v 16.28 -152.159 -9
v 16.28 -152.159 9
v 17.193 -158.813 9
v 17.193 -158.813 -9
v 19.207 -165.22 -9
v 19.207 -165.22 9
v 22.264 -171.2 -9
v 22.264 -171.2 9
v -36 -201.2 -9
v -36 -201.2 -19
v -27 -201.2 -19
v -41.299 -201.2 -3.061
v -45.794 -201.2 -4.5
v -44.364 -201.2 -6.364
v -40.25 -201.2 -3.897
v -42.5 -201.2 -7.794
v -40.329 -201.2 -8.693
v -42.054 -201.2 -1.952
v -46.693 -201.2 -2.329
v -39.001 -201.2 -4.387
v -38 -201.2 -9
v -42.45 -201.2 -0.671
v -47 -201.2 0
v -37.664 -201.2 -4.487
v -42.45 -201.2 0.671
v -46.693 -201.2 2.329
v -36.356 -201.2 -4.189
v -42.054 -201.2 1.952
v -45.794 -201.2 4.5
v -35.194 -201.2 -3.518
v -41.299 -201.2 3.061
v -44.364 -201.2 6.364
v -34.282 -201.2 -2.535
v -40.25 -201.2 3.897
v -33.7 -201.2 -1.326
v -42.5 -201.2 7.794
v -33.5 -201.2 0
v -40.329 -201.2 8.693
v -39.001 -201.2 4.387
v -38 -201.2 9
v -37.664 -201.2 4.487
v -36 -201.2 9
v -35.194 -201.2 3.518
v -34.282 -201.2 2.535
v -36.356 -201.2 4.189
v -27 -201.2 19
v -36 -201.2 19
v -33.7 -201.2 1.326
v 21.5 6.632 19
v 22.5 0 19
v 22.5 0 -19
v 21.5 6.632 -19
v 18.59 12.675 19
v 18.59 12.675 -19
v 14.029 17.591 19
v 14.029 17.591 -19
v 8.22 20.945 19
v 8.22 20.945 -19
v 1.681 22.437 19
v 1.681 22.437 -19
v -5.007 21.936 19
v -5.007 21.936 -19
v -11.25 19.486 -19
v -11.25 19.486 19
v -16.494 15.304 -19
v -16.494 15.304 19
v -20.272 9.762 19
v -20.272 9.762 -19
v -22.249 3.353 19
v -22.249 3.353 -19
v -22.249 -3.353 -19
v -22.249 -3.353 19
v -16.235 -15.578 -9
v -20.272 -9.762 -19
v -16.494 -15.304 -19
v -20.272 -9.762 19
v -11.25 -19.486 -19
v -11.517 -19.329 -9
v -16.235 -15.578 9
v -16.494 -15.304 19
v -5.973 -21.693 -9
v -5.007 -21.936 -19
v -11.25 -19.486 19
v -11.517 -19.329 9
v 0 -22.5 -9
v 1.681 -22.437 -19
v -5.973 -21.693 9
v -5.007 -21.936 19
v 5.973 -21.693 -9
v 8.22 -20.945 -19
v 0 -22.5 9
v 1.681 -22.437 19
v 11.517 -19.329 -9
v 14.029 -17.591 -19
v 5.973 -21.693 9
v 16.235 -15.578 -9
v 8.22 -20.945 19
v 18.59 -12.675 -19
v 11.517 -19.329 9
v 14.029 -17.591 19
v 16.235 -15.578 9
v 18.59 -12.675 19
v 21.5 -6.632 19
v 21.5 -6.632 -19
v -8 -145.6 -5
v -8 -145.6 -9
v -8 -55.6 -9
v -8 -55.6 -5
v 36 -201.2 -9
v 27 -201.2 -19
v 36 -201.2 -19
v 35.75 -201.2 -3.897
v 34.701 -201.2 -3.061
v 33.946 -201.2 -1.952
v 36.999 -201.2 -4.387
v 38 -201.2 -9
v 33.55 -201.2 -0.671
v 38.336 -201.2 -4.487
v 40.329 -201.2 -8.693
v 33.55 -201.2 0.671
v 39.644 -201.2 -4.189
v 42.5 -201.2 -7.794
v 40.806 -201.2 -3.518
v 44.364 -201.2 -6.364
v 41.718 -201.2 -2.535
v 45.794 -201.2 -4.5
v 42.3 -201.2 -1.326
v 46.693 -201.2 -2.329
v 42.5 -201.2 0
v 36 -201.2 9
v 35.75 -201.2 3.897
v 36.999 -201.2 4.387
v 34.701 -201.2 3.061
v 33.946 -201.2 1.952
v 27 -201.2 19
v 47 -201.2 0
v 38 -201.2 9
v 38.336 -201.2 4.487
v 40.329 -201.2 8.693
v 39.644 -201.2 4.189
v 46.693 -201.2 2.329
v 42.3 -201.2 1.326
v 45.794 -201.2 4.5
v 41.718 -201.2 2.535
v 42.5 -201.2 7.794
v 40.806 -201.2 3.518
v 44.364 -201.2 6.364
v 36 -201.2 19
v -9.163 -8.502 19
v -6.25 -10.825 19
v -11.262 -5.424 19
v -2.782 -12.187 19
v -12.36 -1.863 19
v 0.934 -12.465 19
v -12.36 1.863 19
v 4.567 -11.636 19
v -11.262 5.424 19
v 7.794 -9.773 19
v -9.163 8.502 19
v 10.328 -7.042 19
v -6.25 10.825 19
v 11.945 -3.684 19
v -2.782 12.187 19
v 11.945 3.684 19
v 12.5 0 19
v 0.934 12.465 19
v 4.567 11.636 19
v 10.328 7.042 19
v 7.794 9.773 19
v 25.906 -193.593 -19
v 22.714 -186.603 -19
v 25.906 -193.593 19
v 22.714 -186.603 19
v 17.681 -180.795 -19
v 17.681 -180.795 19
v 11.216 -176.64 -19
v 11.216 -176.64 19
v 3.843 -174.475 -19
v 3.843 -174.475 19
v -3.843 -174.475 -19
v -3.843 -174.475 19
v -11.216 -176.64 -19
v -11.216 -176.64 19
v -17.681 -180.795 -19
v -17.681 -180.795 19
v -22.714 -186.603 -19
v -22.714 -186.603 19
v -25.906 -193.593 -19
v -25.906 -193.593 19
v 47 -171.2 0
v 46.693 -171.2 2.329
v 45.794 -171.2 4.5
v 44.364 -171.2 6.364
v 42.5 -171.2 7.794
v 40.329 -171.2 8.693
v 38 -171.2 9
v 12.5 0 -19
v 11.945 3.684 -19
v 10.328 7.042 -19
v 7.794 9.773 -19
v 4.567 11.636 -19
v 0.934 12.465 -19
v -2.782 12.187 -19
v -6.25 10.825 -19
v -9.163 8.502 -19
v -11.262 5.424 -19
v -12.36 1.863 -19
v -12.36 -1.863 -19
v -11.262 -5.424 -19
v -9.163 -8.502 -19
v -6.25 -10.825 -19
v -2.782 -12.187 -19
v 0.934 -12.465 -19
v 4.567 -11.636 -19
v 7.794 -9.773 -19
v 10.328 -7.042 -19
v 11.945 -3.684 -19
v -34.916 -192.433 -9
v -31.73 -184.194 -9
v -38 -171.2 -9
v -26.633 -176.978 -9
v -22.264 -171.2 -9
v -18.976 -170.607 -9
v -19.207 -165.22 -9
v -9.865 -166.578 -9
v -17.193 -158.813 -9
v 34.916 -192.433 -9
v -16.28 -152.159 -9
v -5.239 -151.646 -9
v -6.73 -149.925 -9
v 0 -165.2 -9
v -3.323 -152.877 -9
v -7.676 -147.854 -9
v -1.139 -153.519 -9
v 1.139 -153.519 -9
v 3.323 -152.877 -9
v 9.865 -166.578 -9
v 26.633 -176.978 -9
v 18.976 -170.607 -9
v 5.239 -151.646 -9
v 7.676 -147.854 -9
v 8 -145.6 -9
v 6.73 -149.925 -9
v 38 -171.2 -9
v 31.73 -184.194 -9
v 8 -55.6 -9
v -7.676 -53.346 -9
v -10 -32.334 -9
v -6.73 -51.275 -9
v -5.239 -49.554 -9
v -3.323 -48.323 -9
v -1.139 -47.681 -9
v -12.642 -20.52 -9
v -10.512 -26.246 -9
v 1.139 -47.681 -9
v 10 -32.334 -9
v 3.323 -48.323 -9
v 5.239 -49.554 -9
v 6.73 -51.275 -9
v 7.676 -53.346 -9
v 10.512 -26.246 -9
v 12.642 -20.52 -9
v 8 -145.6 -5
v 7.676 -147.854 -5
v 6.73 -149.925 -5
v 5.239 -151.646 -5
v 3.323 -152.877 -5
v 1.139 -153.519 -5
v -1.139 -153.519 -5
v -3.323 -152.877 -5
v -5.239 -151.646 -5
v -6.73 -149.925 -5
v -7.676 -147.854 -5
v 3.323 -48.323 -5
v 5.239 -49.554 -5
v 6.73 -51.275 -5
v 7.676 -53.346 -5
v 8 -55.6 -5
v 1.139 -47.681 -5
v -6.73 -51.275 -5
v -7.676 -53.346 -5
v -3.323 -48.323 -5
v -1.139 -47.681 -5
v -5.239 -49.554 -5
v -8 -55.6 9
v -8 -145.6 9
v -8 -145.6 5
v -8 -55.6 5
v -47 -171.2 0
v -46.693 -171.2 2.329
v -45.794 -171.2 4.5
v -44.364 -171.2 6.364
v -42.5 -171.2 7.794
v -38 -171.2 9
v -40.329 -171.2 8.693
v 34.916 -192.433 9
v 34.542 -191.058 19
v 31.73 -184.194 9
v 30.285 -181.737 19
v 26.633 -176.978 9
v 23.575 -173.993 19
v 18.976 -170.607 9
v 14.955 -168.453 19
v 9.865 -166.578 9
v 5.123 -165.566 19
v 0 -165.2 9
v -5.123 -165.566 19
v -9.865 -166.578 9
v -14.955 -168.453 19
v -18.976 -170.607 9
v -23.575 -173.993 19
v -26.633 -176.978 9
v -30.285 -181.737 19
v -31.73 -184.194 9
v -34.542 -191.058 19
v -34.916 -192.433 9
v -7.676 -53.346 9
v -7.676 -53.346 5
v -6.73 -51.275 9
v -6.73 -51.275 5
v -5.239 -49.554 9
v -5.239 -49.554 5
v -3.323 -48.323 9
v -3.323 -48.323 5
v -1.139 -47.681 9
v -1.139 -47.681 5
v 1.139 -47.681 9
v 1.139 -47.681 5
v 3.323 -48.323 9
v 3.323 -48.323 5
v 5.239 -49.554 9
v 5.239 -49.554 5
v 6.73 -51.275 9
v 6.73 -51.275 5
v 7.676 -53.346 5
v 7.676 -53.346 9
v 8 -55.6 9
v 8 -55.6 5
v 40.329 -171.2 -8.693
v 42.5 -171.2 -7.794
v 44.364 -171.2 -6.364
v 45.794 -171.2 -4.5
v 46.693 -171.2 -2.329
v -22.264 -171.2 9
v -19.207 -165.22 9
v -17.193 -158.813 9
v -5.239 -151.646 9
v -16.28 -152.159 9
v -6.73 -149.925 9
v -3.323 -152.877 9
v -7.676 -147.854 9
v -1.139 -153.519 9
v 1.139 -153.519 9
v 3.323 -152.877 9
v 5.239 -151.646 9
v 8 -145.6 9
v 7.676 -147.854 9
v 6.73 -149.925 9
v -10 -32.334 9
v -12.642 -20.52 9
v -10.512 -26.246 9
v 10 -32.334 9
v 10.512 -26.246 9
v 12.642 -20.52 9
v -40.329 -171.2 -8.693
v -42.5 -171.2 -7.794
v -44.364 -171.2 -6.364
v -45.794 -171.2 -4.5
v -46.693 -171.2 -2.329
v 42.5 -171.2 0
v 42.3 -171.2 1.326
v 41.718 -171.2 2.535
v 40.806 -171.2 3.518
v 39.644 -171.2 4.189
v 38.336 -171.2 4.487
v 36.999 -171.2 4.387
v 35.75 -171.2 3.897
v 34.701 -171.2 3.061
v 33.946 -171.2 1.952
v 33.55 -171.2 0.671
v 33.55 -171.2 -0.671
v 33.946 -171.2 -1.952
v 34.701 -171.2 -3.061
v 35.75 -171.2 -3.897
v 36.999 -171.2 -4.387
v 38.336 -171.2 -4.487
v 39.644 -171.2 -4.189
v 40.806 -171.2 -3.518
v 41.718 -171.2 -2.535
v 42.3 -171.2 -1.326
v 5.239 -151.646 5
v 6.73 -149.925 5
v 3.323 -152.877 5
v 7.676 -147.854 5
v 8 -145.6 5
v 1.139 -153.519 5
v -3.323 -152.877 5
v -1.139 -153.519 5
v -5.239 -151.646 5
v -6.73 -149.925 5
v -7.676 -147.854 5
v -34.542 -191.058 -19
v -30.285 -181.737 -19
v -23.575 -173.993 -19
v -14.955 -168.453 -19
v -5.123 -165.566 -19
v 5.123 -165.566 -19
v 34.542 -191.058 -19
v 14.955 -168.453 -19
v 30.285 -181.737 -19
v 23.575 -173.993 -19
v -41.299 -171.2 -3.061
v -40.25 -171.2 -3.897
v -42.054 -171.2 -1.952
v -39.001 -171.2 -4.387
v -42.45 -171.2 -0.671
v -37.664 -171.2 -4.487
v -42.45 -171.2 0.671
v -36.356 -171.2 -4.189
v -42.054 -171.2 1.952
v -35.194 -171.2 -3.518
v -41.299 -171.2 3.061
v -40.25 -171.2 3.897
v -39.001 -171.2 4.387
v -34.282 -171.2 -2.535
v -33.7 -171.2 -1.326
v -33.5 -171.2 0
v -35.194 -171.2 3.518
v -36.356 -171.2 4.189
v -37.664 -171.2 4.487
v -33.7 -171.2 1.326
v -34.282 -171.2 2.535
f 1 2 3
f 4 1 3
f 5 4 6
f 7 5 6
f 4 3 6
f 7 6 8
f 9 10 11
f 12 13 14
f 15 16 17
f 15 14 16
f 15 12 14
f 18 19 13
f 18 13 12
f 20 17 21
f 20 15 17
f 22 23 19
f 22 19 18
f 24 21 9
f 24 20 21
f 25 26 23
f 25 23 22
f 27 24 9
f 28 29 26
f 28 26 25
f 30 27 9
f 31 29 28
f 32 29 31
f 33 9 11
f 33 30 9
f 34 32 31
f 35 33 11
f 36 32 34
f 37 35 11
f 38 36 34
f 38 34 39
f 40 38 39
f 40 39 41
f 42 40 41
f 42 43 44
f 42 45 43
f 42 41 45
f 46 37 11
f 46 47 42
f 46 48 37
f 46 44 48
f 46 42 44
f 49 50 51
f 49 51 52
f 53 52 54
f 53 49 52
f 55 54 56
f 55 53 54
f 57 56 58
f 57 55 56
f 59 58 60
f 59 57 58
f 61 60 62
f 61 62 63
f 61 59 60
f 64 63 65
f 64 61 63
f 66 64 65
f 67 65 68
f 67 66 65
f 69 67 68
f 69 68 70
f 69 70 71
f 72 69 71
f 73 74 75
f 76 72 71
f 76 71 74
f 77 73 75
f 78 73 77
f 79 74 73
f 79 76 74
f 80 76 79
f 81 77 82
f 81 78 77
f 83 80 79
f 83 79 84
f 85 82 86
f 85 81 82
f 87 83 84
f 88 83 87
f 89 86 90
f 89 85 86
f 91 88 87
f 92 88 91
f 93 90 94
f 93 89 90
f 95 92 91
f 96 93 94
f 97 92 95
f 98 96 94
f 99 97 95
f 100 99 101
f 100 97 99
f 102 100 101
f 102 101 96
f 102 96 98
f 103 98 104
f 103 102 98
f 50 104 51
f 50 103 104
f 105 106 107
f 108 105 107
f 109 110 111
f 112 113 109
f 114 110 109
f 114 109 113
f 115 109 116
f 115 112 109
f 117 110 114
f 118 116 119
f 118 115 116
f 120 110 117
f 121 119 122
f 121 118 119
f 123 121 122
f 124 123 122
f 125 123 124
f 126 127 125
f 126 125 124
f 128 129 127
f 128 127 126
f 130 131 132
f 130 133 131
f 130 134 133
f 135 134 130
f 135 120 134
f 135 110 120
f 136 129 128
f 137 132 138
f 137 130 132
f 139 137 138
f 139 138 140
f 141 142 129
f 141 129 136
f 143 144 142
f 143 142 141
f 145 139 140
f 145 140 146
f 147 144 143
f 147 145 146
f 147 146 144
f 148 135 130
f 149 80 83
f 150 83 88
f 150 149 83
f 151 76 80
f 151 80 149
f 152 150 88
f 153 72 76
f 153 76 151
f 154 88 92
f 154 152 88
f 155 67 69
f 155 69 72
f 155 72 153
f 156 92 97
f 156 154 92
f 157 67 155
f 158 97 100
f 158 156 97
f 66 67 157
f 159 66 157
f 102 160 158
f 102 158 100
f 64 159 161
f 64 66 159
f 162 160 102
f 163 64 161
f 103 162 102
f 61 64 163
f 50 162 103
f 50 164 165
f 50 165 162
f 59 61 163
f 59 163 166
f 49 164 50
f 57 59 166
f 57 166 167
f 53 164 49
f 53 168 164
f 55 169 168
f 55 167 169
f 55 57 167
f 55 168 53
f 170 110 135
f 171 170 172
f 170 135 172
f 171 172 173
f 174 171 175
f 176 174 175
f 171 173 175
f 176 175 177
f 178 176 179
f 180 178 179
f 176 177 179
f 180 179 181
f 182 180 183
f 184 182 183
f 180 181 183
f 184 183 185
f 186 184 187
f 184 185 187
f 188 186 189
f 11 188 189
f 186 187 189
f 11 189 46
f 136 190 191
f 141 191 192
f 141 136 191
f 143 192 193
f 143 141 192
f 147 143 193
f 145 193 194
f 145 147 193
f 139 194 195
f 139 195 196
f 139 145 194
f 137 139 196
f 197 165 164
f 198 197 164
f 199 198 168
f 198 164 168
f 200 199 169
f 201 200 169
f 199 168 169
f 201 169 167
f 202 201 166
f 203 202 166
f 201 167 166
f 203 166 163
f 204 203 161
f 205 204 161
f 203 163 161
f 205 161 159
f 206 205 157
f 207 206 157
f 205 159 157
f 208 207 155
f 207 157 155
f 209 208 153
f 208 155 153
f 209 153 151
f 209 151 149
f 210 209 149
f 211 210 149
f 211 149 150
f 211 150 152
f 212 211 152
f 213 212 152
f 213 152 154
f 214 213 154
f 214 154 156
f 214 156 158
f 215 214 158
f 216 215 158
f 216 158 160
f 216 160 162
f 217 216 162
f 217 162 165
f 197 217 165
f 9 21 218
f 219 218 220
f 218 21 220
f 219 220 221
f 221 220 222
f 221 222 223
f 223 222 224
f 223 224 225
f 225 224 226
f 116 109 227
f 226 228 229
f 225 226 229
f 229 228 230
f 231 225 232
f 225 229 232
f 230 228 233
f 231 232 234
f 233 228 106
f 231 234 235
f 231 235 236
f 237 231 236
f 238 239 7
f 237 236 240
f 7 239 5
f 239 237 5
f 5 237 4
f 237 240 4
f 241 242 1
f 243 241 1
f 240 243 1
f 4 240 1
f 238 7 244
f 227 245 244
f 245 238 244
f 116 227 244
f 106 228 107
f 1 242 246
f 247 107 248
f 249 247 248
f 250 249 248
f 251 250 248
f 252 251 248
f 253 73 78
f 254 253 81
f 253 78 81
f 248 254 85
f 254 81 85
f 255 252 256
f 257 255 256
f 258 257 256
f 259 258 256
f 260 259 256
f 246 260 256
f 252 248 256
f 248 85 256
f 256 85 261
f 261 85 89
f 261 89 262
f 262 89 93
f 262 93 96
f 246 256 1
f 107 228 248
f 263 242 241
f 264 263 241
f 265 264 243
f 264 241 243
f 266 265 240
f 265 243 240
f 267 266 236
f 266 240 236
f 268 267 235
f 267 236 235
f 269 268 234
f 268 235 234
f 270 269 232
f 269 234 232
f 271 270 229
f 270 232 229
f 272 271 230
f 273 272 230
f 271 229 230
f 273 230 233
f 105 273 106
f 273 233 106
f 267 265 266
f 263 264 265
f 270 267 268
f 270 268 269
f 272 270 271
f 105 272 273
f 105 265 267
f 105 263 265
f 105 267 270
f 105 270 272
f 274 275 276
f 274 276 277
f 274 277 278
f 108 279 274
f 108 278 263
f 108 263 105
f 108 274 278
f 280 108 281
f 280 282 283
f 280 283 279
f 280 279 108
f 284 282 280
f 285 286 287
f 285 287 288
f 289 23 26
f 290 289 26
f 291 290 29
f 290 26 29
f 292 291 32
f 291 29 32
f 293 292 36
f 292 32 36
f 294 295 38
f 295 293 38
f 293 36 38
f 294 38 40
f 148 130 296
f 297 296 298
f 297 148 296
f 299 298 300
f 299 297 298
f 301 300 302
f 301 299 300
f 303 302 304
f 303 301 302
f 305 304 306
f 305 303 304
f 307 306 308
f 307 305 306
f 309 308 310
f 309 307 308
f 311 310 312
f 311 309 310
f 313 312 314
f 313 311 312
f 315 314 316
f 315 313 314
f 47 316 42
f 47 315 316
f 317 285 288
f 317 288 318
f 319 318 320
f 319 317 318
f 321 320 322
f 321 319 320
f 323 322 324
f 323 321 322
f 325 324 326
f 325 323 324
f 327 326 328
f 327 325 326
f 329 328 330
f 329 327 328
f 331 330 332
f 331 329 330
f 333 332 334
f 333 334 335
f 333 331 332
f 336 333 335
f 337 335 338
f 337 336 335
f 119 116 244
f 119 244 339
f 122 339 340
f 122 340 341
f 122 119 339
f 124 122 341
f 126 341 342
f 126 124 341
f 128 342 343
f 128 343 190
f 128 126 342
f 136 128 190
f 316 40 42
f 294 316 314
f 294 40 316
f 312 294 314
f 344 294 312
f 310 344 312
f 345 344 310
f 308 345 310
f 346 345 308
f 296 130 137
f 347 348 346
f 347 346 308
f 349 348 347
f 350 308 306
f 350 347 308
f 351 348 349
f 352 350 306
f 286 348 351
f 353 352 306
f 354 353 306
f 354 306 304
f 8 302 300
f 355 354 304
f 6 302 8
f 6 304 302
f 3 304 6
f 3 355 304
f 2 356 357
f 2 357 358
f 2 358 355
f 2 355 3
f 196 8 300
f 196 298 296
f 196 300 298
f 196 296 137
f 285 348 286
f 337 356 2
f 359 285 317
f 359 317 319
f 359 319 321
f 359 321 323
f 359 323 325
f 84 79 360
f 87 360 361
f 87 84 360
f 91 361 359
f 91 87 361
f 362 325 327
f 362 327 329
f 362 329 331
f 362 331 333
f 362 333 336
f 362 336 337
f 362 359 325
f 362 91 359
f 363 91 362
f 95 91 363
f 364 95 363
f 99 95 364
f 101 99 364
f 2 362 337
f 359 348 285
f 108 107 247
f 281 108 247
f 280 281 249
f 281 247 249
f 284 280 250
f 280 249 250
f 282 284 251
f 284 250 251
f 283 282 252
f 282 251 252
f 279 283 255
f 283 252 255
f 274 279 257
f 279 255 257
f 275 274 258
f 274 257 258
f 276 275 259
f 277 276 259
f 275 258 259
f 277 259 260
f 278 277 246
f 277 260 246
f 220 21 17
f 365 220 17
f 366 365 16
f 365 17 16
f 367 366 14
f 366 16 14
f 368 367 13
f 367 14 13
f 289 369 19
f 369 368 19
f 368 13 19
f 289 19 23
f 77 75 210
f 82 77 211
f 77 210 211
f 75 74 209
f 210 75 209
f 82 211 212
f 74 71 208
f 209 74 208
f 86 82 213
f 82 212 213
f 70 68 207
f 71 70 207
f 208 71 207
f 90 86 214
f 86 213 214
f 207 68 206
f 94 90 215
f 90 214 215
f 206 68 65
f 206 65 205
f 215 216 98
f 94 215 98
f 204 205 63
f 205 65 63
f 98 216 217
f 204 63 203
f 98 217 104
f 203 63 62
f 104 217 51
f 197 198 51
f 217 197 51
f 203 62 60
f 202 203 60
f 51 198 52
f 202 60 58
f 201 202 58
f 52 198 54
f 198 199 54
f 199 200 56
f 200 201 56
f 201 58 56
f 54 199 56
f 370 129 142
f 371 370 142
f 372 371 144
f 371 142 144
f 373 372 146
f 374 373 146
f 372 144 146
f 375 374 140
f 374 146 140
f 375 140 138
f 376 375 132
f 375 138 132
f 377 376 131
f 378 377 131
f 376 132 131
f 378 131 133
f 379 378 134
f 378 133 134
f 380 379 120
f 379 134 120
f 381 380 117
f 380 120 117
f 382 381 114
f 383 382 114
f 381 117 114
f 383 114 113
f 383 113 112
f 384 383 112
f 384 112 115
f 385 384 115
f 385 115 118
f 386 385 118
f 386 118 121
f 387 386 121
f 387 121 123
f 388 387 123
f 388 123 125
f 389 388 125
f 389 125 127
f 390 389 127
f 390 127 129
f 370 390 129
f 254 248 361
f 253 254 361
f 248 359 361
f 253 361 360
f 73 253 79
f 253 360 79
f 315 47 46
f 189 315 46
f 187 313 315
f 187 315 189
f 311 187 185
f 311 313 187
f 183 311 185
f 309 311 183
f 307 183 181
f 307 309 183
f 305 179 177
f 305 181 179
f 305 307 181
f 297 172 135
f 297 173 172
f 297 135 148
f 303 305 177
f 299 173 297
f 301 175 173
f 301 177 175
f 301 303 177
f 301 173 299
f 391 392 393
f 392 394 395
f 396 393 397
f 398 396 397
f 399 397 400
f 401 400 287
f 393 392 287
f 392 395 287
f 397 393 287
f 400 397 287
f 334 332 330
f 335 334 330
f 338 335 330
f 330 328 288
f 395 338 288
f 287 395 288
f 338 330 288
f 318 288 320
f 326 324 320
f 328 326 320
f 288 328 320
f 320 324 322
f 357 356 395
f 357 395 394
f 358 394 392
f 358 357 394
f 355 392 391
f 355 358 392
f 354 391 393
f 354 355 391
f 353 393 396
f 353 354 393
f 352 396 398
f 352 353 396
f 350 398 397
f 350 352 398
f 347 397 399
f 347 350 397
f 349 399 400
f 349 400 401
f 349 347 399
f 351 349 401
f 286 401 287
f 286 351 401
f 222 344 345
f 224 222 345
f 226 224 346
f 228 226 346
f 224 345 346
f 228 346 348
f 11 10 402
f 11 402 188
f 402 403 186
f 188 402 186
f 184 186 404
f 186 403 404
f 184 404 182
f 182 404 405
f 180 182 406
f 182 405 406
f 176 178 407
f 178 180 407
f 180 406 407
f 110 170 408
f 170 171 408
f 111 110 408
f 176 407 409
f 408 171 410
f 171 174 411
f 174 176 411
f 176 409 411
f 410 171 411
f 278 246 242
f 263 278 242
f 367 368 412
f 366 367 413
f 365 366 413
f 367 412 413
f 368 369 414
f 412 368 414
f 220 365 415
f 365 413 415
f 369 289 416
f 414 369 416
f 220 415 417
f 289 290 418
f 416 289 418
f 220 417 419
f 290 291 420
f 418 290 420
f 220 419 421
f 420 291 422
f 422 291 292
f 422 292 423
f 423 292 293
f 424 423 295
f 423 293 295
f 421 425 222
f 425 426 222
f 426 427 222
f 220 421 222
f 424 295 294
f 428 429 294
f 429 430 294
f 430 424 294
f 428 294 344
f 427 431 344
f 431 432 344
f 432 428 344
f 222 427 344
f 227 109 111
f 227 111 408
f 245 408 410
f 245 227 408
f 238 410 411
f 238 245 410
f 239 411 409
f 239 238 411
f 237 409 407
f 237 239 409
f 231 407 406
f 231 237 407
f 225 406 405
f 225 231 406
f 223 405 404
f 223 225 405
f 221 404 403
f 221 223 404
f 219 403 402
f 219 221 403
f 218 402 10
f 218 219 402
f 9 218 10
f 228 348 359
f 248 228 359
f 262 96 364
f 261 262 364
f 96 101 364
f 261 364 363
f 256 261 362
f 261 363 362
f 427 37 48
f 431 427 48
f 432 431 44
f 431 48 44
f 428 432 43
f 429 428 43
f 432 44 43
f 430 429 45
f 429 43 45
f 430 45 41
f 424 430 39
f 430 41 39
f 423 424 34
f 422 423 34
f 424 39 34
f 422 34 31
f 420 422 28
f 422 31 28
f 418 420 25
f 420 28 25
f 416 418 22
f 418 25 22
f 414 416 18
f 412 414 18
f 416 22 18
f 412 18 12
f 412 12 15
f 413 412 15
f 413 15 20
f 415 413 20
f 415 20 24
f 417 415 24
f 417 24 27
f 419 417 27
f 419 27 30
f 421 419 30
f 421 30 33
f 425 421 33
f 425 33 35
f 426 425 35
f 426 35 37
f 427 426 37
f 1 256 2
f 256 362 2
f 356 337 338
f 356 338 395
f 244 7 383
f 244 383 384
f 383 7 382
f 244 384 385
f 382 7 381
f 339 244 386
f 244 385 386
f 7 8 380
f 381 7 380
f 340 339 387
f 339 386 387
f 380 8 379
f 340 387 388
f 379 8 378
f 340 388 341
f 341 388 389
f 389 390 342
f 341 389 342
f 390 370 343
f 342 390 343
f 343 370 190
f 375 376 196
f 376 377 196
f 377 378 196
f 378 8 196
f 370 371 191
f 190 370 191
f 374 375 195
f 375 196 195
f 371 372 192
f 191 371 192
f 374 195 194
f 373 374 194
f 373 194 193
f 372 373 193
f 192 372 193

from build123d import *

# Parameters (mm, degrees)
SKETCH1_R             = 22.5
BOSS_EXTRUDE1_DEPTH   = 19
BOSS_EXTRUDE1_2_DEPTH = 19
BOSS_EXTRUDE2_DEPTH   = 9
CUT_EXTRUDE1_DEPTH    = 4
SKETCH6_W             = 94
SKETCH6_H             = 30
BOSS_EXTRUDE3_DEPTH   = 9
SKETCH4_R             = 12.5
CUT_EXTRUDE2_DEPTH    = 39
SKETCH5_R             = 4.5
CUT_EXTRUDE3_DEPTH    = 224.7
CUT_EXTRUDE4_DEPTH    = 224.7


with BuildPart() as part:
    # Sketch1 → Boss-Extrude1 (new body, symmetric)
    with BuildSketch(Plane.XY):
        Circle(SKETCH1_R)
    extrude(amount=BOSS_EXTRUDE1_DEPTH, both=True)



with BuildPart() as body_2:
    # Sketch1 → Boss-Extrude1 2 (new body, symmetric)
    with BuildSketch(Plane.XY):
        with BuildLine():
            Line((-36, -201.2), (36, -201.2))
            ThreePointArc((36, -201.2), (0, -165.2), (-36, -201.2))
        make_face()
    extrude(amount=BOSS_EXTRUDE1_2_DEPTH, both=True)


with BuildPart() as part_1:
    add(part.part)

    add(body_2.part)  # Boss-Extrude2 merges body 2
    # Sketch2 → Boss-Extrude2 (add, symmetric)
    with BuildSketch(Plane.XY):
        with BuildLine():
            Line((-16.279722223, -152.158712146), (-10, -32.334474052))
            ThreePointArc((-10, -32.334474052), (-11.381584619, -23.310643729), (-16.234582266, -15.578457518))
            ThreePointArc((-16.234582266, -15.578457518), (0, -22.5), (16.234582266, -15.578457518))
            ThreePointArc((16.234582266, -15.578457518), (11.381584619, -23.310643729), (10, -32.334474052))
            Line((10, -32.334474052), (16.279722223, -152.158712146))
            ThreePointArc((16.279722223, -152.158712146), (19.307974883, -165.464636648), (26.63284908, -176.978287635))
            ThreePointArc((26.63284908, -176.978287635), (0, -165.2), (-26.63284908, -176.978287635))
            ThreePointArc((-26.63284908, -176.978287635), (-19.307974883, -165.464636648), (-16.279722223, -152.158712146))
        make_face()
    extrude(amount=BOSS_EXTRUDE2_DEPTH, both=True)

    # Sketch3 → Cut-Extrude1 (cut)
    with BuildSketch(Plane.XY.offset(9)):
        with BuildLine():
            Line((-8, -145.6), (-8, -55.6))
            ThreePointArc((-8, -55.6), (0, -47.6), (8, -55.6))
            Line((8, -55.6), (8, -145.6))
            ThreePointArc((8, -145.6), (0, -153.6), (-8, -145.6))
        make_face()
    cut_extrude1 = extrude(amount=-CUT_EXTRUDE1_DEPTH, mode=Mode.SUBTRACT)

    # Mirror1: Cut-Extrude1 across plane
    add(cut_extrude1.mirror(Plane.XY), mode=Mode.SUBTRACT)

    # Sketch6 → Boss-Extrude3 (add, symmetric)
    with BuildSketch(Plane.XY):
        with Locations((0, -186.2)):
            Rectangle(SKETCH6_W, SKETCH6_H)
    extrude(amount=BOSS_EXTRUDE3_DEPTH, both=True)

    # Sketch4 → Cut-Extrude2 (cut, through all)
    with BuildSketch(Plane.XY.offset(19)):
        Circle(SKETCH4_R)
        with BuildLine():
            Line((-27, -201.2), (27, -201.2))
            ThreePointArc((27, -201.2), (0, -174.2), (-27, -201.2))
        make_face()
    extrude(amount=-CUT_EXTRUDE2_DEPTH, mode=Mode.SUBTRACT)

    # Sketch5 → Cut-Extrude3 (cut, through all)
    with BuildSketch(Plane.XZ.offset(201.2)):
        with Locations((-38, 0)):
            Circle(SKETCH5_R)
        with Locations((38, 0)):
            Circle(SKETCH5_R)
    extrude(amount=-CUT_EXTRUDE3_DEPTH, mode=Mode.SUBTRACT)

    # Sketch7 → Cut-Extrude4 (cut, through all)
    with BuildSketch(Plane.XZ.offset(201.2)):
        with BuildLine():
            ThreePointArc((-38, -9), (-44.363961031, -6.363961031), (-47, 0))
            Line((-47, 0), (-47, -9))
            Line((-47, -9), (-38, -9))
        make_face()
        with BuildLine():
            Line((-38, 9), (-47, 9))
            Line((-47, 9), (-47, 0))
            ThreePointArc((-47, 0), (-44.363961031, 6.363961031), (-38, 9))
        make_face()
    cut_extrude4 = extrude(amount=-CUT_EXTRUDE4_DEPTH, mode=Mode.SUBTRACT)

    # Mirror2: Cut-Extrude4 across plane
    add(cut_extrude4.mirror(Plane(origin=(0, 0, 0), x_dir=(0, 0, 1), z_dir=(1, 0, 0))), mode=Mode.SUBTRACT)


solid = part_1.part
